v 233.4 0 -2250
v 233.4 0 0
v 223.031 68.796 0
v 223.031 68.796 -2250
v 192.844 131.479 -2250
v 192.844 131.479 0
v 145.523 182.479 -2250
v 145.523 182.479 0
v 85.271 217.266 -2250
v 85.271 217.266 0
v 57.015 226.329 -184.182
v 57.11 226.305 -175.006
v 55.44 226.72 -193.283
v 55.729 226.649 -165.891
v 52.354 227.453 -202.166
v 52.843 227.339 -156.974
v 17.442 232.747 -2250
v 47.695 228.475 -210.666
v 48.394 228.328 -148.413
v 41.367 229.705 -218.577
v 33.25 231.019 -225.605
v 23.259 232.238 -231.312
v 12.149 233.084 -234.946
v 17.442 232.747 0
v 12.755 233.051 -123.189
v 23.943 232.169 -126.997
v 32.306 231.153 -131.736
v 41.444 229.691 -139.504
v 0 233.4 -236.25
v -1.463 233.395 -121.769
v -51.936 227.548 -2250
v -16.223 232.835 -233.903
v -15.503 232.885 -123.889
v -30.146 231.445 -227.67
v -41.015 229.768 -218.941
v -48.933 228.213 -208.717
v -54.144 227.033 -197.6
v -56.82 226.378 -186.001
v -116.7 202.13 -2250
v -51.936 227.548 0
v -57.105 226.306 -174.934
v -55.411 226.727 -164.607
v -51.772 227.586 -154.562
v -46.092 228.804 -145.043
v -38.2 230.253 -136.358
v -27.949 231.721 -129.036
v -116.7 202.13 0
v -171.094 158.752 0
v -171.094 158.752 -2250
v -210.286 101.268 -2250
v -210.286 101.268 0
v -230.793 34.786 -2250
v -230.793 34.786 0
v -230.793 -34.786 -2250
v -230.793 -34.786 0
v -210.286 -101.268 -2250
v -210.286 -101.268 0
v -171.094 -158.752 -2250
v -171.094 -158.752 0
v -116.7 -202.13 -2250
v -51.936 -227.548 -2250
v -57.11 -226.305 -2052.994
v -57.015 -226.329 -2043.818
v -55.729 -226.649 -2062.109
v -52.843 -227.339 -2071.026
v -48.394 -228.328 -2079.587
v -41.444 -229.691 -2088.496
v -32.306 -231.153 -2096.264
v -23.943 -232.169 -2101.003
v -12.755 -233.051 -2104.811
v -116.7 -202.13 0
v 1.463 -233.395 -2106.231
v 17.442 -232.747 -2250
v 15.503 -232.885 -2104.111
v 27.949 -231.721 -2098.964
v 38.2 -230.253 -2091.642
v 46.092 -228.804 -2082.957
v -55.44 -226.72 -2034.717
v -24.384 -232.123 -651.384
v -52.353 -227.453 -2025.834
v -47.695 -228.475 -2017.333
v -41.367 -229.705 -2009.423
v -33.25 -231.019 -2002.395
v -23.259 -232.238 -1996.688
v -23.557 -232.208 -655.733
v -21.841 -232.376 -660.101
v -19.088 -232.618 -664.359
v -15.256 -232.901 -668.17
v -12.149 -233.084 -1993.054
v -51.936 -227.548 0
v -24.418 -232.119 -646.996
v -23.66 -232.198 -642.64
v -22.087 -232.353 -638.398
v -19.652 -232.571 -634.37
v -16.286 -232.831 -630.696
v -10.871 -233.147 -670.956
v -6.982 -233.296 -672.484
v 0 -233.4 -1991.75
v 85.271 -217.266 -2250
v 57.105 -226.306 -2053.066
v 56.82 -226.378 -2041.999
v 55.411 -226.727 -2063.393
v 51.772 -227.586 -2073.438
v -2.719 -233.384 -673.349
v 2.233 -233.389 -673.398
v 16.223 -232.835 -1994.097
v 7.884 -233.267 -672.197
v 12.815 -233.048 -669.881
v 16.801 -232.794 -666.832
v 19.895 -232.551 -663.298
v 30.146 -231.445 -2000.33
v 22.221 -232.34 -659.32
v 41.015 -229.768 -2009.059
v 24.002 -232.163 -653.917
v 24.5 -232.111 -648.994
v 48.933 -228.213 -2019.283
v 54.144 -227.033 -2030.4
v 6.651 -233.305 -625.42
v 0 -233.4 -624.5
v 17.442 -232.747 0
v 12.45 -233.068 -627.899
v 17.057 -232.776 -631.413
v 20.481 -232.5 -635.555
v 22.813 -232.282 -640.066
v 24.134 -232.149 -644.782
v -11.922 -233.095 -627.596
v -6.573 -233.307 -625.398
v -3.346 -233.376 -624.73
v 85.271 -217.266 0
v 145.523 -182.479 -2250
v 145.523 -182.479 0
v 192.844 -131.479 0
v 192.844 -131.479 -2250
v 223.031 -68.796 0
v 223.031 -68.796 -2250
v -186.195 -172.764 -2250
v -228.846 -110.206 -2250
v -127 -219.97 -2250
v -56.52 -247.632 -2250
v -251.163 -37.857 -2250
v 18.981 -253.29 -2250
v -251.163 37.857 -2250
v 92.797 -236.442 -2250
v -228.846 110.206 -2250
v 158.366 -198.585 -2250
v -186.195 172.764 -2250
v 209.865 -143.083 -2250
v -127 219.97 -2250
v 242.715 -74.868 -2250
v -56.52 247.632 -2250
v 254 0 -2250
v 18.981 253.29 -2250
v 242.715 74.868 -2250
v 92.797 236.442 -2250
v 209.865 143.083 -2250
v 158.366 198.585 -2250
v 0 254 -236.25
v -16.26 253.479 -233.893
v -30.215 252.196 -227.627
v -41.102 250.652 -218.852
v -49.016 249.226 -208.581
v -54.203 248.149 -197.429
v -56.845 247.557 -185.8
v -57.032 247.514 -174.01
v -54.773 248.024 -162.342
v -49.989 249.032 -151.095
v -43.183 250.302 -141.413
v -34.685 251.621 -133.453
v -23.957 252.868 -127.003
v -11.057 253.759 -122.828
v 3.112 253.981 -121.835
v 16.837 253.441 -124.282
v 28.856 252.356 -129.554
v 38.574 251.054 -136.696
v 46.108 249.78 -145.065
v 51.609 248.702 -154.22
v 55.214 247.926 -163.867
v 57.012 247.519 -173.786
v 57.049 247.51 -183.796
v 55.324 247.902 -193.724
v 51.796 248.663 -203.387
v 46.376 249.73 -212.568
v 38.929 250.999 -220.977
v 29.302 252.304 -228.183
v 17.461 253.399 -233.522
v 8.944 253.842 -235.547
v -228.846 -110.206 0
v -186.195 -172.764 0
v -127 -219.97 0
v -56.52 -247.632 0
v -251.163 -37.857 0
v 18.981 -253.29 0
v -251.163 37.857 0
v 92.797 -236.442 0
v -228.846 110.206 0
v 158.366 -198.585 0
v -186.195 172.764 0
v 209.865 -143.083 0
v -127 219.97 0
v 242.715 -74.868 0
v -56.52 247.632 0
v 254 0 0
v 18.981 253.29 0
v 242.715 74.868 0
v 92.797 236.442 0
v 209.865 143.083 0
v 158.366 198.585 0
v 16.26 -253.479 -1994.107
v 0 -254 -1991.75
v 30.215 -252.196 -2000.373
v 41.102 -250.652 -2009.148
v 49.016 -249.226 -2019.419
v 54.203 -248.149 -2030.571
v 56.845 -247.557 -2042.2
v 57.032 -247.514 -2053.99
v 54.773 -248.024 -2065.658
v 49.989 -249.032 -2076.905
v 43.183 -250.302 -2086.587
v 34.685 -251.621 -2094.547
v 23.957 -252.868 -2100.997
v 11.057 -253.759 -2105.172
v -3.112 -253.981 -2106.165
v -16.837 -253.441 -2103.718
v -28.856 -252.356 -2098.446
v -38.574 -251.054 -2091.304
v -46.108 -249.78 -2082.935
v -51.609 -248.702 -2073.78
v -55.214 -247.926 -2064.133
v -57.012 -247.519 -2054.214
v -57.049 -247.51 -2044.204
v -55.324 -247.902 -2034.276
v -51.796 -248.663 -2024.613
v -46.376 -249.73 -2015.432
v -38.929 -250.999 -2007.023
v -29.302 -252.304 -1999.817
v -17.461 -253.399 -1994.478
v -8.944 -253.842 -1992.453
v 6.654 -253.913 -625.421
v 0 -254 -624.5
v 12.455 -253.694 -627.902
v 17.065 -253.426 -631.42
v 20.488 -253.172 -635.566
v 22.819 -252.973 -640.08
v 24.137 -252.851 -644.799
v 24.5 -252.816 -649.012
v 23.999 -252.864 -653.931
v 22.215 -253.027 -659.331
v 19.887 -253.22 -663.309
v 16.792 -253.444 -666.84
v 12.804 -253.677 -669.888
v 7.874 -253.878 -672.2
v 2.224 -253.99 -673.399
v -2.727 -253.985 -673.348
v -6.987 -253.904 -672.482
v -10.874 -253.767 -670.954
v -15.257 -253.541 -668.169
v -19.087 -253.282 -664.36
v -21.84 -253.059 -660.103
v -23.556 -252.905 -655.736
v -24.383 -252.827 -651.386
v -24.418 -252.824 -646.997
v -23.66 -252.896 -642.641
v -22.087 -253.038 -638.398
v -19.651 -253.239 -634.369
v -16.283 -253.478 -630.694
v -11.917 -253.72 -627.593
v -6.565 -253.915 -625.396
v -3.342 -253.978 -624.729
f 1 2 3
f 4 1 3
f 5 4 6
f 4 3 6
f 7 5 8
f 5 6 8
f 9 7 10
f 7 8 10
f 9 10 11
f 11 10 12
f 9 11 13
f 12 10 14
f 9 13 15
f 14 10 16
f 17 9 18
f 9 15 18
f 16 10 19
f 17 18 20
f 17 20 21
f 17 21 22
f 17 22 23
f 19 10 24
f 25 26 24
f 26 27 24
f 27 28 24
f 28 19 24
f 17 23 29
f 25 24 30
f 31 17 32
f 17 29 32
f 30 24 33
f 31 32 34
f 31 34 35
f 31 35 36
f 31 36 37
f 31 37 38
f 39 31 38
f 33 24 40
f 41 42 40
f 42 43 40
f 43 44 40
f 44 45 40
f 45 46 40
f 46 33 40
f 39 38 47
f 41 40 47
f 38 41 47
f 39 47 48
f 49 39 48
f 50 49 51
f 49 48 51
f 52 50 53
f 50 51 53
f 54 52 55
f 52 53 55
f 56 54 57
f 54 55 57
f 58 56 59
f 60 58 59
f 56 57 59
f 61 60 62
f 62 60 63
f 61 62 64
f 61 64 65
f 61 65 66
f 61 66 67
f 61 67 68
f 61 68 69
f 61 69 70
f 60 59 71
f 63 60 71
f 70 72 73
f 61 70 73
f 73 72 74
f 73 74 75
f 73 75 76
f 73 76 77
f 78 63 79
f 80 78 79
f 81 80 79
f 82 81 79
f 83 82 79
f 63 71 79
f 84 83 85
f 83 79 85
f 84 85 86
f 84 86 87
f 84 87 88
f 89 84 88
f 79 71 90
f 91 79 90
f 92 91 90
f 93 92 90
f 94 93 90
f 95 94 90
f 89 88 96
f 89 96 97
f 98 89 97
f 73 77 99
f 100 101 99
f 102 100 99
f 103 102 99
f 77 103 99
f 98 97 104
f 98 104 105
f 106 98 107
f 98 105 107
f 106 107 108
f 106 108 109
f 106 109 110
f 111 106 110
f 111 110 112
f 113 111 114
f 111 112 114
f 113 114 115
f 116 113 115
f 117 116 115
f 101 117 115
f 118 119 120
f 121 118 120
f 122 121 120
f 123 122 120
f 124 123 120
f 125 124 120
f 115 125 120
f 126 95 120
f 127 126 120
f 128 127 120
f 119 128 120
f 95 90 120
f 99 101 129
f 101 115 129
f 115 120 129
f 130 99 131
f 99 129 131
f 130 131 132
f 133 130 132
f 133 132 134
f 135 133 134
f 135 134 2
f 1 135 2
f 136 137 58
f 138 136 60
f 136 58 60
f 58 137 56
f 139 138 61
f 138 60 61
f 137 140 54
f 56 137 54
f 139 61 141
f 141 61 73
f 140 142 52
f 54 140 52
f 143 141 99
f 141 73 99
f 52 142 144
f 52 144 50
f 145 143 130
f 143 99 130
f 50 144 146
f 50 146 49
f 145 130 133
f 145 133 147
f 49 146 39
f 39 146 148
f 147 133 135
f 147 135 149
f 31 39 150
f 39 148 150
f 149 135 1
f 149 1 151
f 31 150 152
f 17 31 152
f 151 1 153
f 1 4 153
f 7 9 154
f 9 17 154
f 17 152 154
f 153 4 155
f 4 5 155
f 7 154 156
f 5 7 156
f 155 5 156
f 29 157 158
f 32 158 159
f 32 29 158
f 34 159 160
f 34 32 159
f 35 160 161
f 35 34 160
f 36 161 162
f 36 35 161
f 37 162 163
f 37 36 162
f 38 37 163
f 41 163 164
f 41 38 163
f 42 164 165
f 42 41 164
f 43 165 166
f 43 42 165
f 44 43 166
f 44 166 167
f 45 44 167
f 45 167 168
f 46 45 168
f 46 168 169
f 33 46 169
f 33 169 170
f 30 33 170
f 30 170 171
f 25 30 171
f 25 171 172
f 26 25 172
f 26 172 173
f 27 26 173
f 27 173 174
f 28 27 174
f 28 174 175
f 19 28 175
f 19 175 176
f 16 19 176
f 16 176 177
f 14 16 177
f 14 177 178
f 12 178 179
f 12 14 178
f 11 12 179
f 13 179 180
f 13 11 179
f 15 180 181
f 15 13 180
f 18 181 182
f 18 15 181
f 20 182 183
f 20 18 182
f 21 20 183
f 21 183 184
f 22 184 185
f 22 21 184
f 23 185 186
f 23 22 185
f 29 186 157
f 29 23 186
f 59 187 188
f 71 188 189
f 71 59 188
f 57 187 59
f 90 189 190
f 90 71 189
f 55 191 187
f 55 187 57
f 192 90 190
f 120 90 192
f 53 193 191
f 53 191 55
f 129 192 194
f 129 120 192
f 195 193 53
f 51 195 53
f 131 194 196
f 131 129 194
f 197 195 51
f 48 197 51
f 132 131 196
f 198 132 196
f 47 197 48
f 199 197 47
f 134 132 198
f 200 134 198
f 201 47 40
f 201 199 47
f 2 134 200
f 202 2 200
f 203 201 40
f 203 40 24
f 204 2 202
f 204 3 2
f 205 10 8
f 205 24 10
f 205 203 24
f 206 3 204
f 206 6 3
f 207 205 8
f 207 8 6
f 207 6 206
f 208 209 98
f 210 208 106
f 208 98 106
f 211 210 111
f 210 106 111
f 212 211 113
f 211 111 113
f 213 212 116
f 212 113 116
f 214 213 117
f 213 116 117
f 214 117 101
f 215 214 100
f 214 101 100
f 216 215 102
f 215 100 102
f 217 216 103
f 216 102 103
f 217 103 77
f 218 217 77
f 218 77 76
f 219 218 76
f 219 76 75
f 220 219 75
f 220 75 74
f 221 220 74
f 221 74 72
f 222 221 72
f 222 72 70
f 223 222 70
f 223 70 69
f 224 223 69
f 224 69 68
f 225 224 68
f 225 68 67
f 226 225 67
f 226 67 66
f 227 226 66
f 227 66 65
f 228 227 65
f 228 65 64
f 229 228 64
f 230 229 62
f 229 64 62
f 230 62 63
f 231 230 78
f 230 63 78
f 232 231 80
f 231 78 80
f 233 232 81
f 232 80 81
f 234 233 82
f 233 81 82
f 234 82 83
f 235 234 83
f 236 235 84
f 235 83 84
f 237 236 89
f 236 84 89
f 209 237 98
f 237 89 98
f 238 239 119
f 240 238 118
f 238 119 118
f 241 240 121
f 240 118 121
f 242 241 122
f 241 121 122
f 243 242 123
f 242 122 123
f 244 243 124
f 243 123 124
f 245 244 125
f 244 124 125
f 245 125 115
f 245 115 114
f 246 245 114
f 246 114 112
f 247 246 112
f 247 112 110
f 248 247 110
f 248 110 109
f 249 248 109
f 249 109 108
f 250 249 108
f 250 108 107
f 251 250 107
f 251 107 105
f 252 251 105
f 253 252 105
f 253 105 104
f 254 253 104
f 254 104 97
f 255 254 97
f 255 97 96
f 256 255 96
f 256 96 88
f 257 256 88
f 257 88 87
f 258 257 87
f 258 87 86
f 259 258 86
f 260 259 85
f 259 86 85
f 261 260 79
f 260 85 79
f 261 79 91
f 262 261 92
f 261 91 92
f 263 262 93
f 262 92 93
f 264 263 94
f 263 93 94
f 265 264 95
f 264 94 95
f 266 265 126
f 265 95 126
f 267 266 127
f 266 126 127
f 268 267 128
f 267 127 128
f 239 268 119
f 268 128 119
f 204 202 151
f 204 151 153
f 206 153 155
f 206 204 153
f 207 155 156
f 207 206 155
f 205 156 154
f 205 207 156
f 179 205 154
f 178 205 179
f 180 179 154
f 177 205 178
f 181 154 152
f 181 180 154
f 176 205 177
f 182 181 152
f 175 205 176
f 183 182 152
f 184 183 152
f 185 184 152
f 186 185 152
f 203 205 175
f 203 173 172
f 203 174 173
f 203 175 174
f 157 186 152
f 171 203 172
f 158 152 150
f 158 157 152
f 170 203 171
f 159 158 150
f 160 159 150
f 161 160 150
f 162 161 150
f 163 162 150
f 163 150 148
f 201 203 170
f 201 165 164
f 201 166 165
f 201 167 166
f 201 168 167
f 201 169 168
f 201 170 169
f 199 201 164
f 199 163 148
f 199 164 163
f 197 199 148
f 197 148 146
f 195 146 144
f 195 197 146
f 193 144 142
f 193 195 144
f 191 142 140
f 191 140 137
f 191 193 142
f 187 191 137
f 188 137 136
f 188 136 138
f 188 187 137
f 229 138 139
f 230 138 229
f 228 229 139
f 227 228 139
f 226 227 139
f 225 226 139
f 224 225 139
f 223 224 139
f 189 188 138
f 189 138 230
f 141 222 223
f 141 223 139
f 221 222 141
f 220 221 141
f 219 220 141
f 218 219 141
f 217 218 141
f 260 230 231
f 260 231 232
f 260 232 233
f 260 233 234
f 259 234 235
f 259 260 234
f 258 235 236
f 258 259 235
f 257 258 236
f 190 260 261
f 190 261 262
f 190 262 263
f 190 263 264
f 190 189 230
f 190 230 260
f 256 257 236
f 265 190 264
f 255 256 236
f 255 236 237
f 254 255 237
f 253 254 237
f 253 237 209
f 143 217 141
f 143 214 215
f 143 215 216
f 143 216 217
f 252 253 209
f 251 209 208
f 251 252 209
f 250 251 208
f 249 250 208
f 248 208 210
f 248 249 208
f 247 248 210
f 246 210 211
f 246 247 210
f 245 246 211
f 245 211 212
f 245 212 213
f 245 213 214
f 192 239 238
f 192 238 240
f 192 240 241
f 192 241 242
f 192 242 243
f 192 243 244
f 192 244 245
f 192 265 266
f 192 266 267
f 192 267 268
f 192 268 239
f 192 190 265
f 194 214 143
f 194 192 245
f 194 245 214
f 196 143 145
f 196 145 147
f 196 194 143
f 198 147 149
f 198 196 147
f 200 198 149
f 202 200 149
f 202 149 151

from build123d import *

# Parameters (mm, degrees)
SKETCH1_R           = 254
SKETCH1_R_2         = 233.4
BOSS_EXTRUDE1_DEPTH = 2250
SKETCH2_R           = 57.25
CUT_EXTRUDE1_DEPTH  = 2250
SKETCH3_R           = 57.25
SKETCH3_R_2         = 24.5
CUT_EXTRUDE2_DEPTH  = 2250


with BuildPart() as part:
    # Sketch1 → Boss-Extrude1 (new body)
    with BuildSketch(Plane.XY):
        Circle(SKETCH1_R)
        Circle(SKETCH1_R_2, mode=Mode.SUBTRACT)
    extrude(amount=-BOSS_EXTRUDE1_DEPTH)

    # Sketch2 → Cut-Extrude1 (cut)
    with BuildSketch(Plane(origin=(0, 0, 0), x_dir=(1, 0, 0), z_dir=(0, 1, 0))):
        with Locations(Location((0, 179, 0), (0, 0, 90))):
            Circle(SKETCH2_R)
    extrude(amount=CUT_EXTRUDE1_DEPTH, mode=Mode.SUBTRACT)

    # Sketch3 → Cut-Extrude2 (cut)
    with BuildSketch(Plane(origin=(0, 0, 0), x_dir=(1, 0, 0), z_dir=(0, 1, 0))):
        with Locations(Location((0, 2049, 0), (0, 0, 270))):
            Circle(SKETCH3_R)
        with Locations(Location((0, 649, 0), (0, 0, 270))):
            Circle(SKETCH3_R_2)
    extrude(amount=-CUT_EXTRUDE2_DEPTH, mode=Mode.SUBTRACT)


solid = part.part
